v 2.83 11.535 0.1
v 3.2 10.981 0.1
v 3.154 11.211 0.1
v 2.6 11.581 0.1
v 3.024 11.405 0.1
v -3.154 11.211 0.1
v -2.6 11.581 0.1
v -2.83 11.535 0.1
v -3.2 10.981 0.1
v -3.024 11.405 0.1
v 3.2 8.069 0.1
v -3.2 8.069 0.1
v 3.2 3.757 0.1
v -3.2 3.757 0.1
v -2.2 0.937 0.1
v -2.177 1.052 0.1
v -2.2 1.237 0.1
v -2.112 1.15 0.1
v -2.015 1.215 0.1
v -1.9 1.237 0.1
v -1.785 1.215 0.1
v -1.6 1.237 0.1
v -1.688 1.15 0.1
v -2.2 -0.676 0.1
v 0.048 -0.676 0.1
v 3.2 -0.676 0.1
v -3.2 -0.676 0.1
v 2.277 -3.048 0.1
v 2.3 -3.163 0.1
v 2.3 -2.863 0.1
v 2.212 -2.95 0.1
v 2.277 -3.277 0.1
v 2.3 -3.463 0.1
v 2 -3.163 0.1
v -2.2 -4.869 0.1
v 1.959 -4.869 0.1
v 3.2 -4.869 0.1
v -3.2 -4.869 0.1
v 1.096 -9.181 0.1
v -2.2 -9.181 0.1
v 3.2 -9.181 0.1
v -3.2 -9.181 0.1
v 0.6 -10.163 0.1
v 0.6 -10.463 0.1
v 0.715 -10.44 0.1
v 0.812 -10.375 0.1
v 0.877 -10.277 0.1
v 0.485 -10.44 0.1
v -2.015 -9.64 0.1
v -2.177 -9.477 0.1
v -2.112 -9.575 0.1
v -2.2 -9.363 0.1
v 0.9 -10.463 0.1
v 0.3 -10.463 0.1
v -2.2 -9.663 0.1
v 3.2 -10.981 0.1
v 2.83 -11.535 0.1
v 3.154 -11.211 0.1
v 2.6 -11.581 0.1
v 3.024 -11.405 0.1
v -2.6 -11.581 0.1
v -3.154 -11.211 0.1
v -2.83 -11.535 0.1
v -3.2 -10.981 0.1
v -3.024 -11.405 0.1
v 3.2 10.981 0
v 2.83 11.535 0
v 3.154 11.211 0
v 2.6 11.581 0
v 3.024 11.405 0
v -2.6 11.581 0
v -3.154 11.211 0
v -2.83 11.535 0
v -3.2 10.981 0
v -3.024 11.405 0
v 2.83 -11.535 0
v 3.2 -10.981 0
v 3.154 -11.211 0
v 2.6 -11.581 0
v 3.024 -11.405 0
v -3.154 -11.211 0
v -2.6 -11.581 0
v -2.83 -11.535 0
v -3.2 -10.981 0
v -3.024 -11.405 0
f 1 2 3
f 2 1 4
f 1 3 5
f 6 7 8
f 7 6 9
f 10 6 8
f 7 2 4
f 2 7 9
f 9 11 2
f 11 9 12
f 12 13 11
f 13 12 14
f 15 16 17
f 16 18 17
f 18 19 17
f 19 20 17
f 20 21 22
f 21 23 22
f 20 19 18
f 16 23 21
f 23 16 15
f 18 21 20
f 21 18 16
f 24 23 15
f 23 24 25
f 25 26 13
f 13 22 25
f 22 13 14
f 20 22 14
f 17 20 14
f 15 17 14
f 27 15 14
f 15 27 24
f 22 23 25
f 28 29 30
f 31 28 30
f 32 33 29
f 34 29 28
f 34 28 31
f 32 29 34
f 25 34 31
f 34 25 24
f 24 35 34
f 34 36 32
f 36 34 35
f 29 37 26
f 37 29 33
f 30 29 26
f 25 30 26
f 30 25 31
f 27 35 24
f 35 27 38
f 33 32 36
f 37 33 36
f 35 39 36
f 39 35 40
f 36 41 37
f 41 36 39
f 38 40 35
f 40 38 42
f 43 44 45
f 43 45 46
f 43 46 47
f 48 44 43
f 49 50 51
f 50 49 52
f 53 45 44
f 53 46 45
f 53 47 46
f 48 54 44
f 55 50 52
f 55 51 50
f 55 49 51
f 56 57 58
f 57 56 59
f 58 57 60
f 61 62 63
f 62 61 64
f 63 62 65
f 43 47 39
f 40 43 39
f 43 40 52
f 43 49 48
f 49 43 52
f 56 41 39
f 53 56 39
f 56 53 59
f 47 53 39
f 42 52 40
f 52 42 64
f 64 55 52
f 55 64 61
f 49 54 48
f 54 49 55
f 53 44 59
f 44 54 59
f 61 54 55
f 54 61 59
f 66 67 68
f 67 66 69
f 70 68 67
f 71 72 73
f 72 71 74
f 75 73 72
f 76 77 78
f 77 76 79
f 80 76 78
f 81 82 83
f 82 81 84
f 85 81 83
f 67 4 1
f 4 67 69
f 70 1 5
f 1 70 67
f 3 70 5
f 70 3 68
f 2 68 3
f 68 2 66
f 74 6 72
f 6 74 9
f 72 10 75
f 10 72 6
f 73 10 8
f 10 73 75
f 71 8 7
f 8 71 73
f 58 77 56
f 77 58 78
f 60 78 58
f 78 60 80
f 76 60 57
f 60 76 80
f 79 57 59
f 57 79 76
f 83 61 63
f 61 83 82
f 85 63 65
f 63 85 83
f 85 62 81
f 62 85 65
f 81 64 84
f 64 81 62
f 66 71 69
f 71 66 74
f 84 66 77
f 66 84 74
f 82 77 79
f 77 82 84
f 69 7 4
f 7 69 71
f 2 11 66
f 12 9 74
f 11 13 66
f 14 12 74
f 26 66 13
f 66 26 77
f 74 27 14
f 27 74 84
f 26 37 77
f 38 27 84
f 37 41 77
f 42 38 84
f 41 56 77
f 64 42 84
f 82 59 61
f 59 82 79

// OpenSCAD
// file: ../p/1-4cyli.scad
use <../lib.scad>
function ldraw_lib__1_4cyli() = [
// 0 Cylinder 0.25
// 0 Name: 1-4cyli.dat
// 0 Author: James Jessiman
// 0 !LDRAW_ORG Primitive UPDATE 2012-01
// 0 !LICENSE Licensed under CC BY 2.0 and CC BY 4.0 : see CAreadme.txt
// 
// 0 BFC CERTIFY CCW
  [0,"BFC","CERTIFY"],
  [0,"BFC","CCW"],
// 
// 0 !HISTORY 2002-03-23 [sbliss] Added BFC statement.
// 0 !HISTORY 2002-04-25 [PTadmin] Official Update 2002-02
// 0 !HISTORY 2007-06-22 [PTadmin] Header formatted for Contributor Agreement
// 0 !HISTORY 2008-07-01 [PTadmin] Official Update 2008-01
// 0 !HISTORY 2012-02-16 [Philo] Changed to CCW
// 0 !HISTORY 2012-03-30 [PTadmin] Official Update 2012-01
// 
// 
// 4 16 1 1 0 0.9239 1 0.3827 0.9239 0 0.3827 1 0 0
  [4,16,1,1,0,0.9239,1,0.3827,0.9239,0,0.3827,1,0,0],
// 5 24 1 0 0 1 1 0 0.9239 0 0.3827 1 0 -1
  [5,24,1,0,0,1,1,0,0.9239,0,0.3827,1,0,-1],
// 4 16 0.9239 1 0.3827 0.7071 1 0.7071 0.7071 0 0.7071 0.9239 0 0.3827
  [4,16,0.9239,1,0.3827,0.7071,1,0.7071,0.7071,0,0.7071,0.9239,0,0.3827],
// 5 24 0.9239 0 0.3827 0.9239 1 0.3827 0.7071 0 0.7071 1 0 0
  [5,24,0.9239,0,0.3827,0.9239,1,0.3827,0.7071,0,0.7071,1,0,0],
// 4 16 0.7071 1 0.7071 0.3827 1 0.9239 0.3827 0 0.9239 0.7071 0 0.7071
  [4,16,0.7071,1,0.7071,0.3827,1,0.9239,0.3827,0,0.9239,0.7071,0,0.7071],
// 5 24 0.7071 0 0.7071 0.7071 1 0.7071 0.3827 0 0.9239 0.9239 0 0.3827
  [5,24,0.7071,0,0.7071,0.7071,1,0.7071,0.3827,0,0.9239,0.9239,0,0.3827],
// 4 16 0.3827 1 0.9239 0 1 1 0 0 1 0.3827 0 0.9239
  [4,16,0.3827,1,0.9239,0,1,1,0,0,1,0.3827,0,0.9239],
// 5 24 0.3827 0 0.9239 0.3827 1 0.9239 0 0 1 0.7071 0 0.7071
  [5,24,0.3827,0,0.9239,0.3827,1,0.9239,0,0,1,0.7071,0,0.7071],
// 5 24 0 0 1 0 1 1 0.3827 0 0.9239 -1 0 1
  [5,24,0,0,1,0,1,1,0.3827,0,0.9239,-1,0,1],
];
makepoly(ldraw_lib__1_4cyli(), line=0.2);
// file: ../p/3-16ndis.scad
use <../lib.scad>
function ldraw_lib__3_16ndis() = [
// 0 Disc Negative 0.1875
// 0 Name: 3-16ndis.dat
// 0 Author: Guy Vivan [guyvivan]
// 0 !LDRAW_ORG Primitive UPDATE 2009-01
// 0 !LICENSE Licensed under CC BY 2.0 and CC BY 4.0 : see CAreadme.txt
// 
// 0 BFC CERTIFY CCW
  [0,"BFC","CERTIFY"],
  [0,"BFC","CCW"],
// 
// 0 !HISTORY 2009-05-02 [PTadmin] Official Update 2009-01
// 
// 
// 3 16 1 0 1 0.9239 0 0.3827 1 0 0
  [3,16,1,0,1,0.9239,0,0.3827,1,0,0],
// 3 16 1 0 1 0.7071 0 0.7071 0.9239 0 0.3827
  [3,16,1,0,1,0.7071,0,0.7071,0.9239,0,0.3827],
// 3 16 1 0 1 0.3827 0 0.9239 0.7071 0 0.7071
  [3,16,1,0,1,0.3827,0,0.9239,0.7071,0,0.7071],
// 
// 0 end of file
// 
];
makepoly(ldraw_lib__3_16ndis(), line=0.2);
// file: ../p/3-16disc.scad
use <../lib.scad>
function ldraw_lib__3_16disc() = [
// 0 Disc 0.1875
// 0 Name: 3-16disc.dat
// 0 Author: Guy Vivan [guyvivan]
// 0 !LDRAW_ORG Primitive UPDATE 2009-01
// 0 !LICENSE Licensed under CC BY 2.0 and CC BY 4.0 : see CAreadme.txt
// 
// 0 BFC CERTIFY CCW
  [0,"BFC","CERTIFY"],
  [0,"BFC","CCW"],
// 
// 0 !HISTORY 2009-05-02 [PTadmin] Official Update 2009-01
// 
// 
// 3 16 0 0 0 1 0 0 0.9239 0 0.3827
  [3,16,0,0,0,1,0,0,0.9239,0,0.3827],
// 3 16 0 0 0 0.9239 0 0.3827 0.7071 0 0.7071
  [3,16,0,0,0,0.9239,0,0.3827,0.7071,0,0.7071],
// 3 16 0 0 0 0.7071 0 0.7071 0.3827 0 0.9239
  [3,16,0,0,0,0.7071,0,0.7071,0.3827,0,0.9239],
// 
// 0 end of file
// 
];
makepoly(ldraw_lib__3_16disc(), line=0.2);
// file: ../p/3-16chrd.scad
use <../lib.scad>
function ldraw_lib__3_16chrd() = [
// 0 Chord 0.1875
// 0 Name: 3-16chrd.dat
// 0 Author: Niels Karsdorp [nielsk]
// 0 !LDRAW_ORG Primitive UPDATE 2009-01
// 0 !LICENSE Licensed under CC BY 2.0 and CC BY 4.0 : see CAreadme.txt
// 
// 0 BFC CERTIFY CCW
  [0,"BFC","CERTIFY"],
  [0,"BFC","CCW"],
// 
// 0 !HISTORY 2009-05-02 [PTadmin] Official Update 2009-01
// 
// 
// 4 16 1 0 0 0.9239 0 0.3827 0.7071 0 0.7071 0.3827 0 0.9239
  [4,16,1,0,0,0.9239,0,0.3827,0.7071,0,0.7071,0.3827,0,0.9239],
// 0
// 
];
makepoly(ldraw_lib__3_16chrd(), line=0.2);
// file: ../p/1-8ndis.scad
use <../lib.scad>
function ldraw_lib__1_8ndis() = [
// 0 Disc Negative 0.125
// 0 Name: 1-8ndis.dat
// 0 Author: James Jessiman
// 0 !LDRAW_ORG Primitive UPDATE 2012-01
// 0 !LICENSE Licensed under CC BY 2.0 and CC BY 4.0 : see CAreadme.txt
// 
// 0 BFC CERTIFY CCW
  [0,"BFC","CERTIFY"],
  [0,"BFC","CCW"],
// 
// 0 !HISTORY 2002-03-23 [sbliss] Added BFC statement
// 0 !HISTORY 2002-04-25 [PTadmin] Official Update 2002-02
// 0 !HISTORY 2007-06-22 [PTadmin] Header formatted for Contributor Agreement
// 0 !HISTORY 2008-07-01 [PTadmin] Official Update 2008-01
// 0 !HISTORY 2012-02-16 [Philo] Changed to CCW
// 0 !HISTORY 2012-03-30 [PTadmin] Official Update 2012-01
// 
// 
// 3 16 0.9239 0 0.3827 1 0 0 1 0 1
  [3,16,0.9239,0,0.3827,1,0,0,1,0,1],
// 3 16 0.7071 0 0.7071 0.9239 0 0.3827 1 0 1
  [3,16,0.7071,0,0.7071,0.9239,0,0.3827,1,0,1],
];
makepoly(ldraw_lib__1_8ndis(), line=0.2);
// file: ../p/1-8disc.scad
use <../lib.scad>
function ldraw_lib__1_8disc() = [
// 0 Disc 0.125
// 0 Name: 1-8disc.dat
// 0 Author: James Jessiman
// 0 !LDRAW_ORG Primitive UPDATE 2002-02
// 0 !LICENSE Licensed under CC BY 2.0 and CC BY 4.0 : see CAreadme.txt
// 
// 0 BFC CERTIFY CCW
  [0,"BFC","CERTIFY"],
  [0,"BFC","CCW"],
// 
// 0 !HISTORY 1998-12-15 [PTadmin] Official Update 1998-10
// 0 !HISTORY 2002-03-23 [sbliss] Added BFC statement; merged headers from files in LDraw 0.27 and Complete.exe distributions.
// 0 !HISTORY 2002-04-25 [PTadmin] Official Update 2002-02
// 0 !HISTORY 2007-06-22 [PTadmin] Header formatted for Contributor Agreement
// 0 !HISTORY 2008-07-01 [PTadmin] Official Update 2008-01
// 
// 
// 3 16 0 0 0 1 0 0 0.9239 0 0.3827
  [3,16,0,0,0,1,0,0,0.9239,0,0.3827],
// 3 16 0 0 0 0.9239 0 0.3827 0.7071 0 0.7071
  [3,16,0,0,0,0.9239,0,0.3827,0.7071,0,0.7071],
// 0
];
makepoly(ldraw_lib__1_8disc(), line=0.2);
// file: ../p/1-16ndis.scad
use <../lib.scad>
function ldraw_lib__1_16ndis() = [
// 0 Disc Negative 0.0625
// 0 Name: 1-16ndis.dat
// 0 Author: Niels Karsdorp [nielsk]
// 0 !LDRAW_ORG Primitive UPDATE 2009-01
// 0 !LICENSE Licensed under CC BY 2.0 and CC BY 4.0 : see CAreadme.txt
// 
// 0 BFC CERTIFY CCW
  [0,"BFC","CERTIFY"],
  [0,"BFC","CCW"],
// 
// 0 !HISTORY 2009-05-02 [PTadmin] Official Update 2009-01
// 
// 
// 3 16 1 0 0 1 0 1 0.9239 0 0.3827
  [3,16,1,0,0,1,0,1,0.9239,0,0.3827],
// 0
];
makepoly(ldraw_lib__1_16ndis(), line=0.2);
// file: ../p/1-16disc.scad
use <../lib.scad>
function ldraw_lib__1_16disc() = [
// 0 Disc 0.0625
// 0 Name: 1-16disc.dat
// 0 Author: Guy Vivan [guyvivan]
// 0 !LDRAW_ORG Primitive UPDATE 2009-01
// 0 !LICENSE Licensed under CC BY 2.0 and CC BY 4.0 : see CAreadme.txt
// 
// 0 BFC CERTIFY CCW
  [0,"BFC","CERTIFY"],
  [0,"BFC","CCW"],
// 
// 0 !HISTORY 2009-05-02 [PTadmin] Official Update 2009-01
// 
// 
// 3 16 0 0 0 1 0 0 0.9239 0 0.3827
  [3,16,0,0,0,1,0,0,0.9239,0,0.3827],
// 
// 0 end of file
// 
];
makepoly(ldraw_lib__1_16disc(), line=0.2);
// file: ../p/3-8ndis.scad
use <../lib.scad>
function ldraw_lib__3_8ndis() = [
// 0 Disc Negative 0.375
// 0 Name: 3-8ndis.dat
// 0 Author: Alex Taylor [anathema]
// 0 !LDRAW_ORG Primitive UPDATE 2009-02
// 0 !LICENSE Licensed under CC BY 2.0 and CC BY 4.0 : see CAreadme.txt
// 
// 0 BFC CERTIFY CCW
  [0,"BFC","CERTIFY"],
  [0,"BFC","CCW"],
// 
// 0 !HISTORY 2009-09-03 [PTadmin] Official Update 2009-02
// 
// 
// 3 16 1 0 1 0.9239 0 0.3827 1 0 0
  [3,16,1,0,1,0.9239,0,0.3827,1,0,0],
// 3 16 1 0 1 0.7071 0 0.7071 0.9239 0 0.3827
  [3,16,1,0,1,0.7071,0,0.7071,0.9239,0,0.3827],
// 3 16 1 0 1 0.3827 0 0.9239 0.7071 0 0.7071
  [3,16,1,0,1,0.3827,0,0.9239,0.7071,0,0.7071],
// 3 16 1 0 1 0 0 1 0.3827 0 0.9239
  [3,16,1,0,1,0,0,1,0.3827,0,0.9239],
// 3 16 -1 0 1 -0.3827 0 0.9239 0 0 1
  [3,16,-1,0,1,-0.3827,0,0.9239,0,0,1],
// 3 16 -1 0 1 -0.7071 0 0.7071 -0.3827 0 0.9239
  [3,16,-1,0,1,-0.7071,0,0.7071,-0.3827,0,0.9239],
// 0
];
makepoly(ldraw_lib__3_8ndis(), line=0.2);
// file: ../p/3-8chrd.scad
use <../lib.scad>
function ldraw_lib__3_8chrd() = [
// 0 Chord 0.375
// 0 Name: 3-8chrd.dat
// 0 Author: Donald Sutter [technog]
// 0 !LDRAW_ORG Primitive UPDATE 2005-01
// 0 !LICENSE Licensed under CC BY 2.0 and CC BY 4.0 : see CAreadme.txt
// 
// 0 BFC CERTIFY CCW
  [0,"BFC","CERTIFY"],
  [0,"BFC","CCW"],
// 
// 0 !HISTORY 2004-01-07 [Steffen] added primitive code for POVray
// 0 !HISTORY 2004-03-18 [mkennedy] removed pov code and rearanged polygons.
// 0 !HISTORY 2004-09-12 [cwdee] reversed winding and standardised precision
// 0 !HISTORY 2005-12-28 [PTadmin] Official Update 2005-01
// 0 !HISTORY 2007-06-24 [PTadmin] Header formatted for Contributor Agreement
// 0 !HISTORY 2008-07-01 [PTadmin] Official Update 2008-01
// 
// 
// 3 16 0.7071 0 0.7071 0.3827 0 0.9239 0 0 1
  [3,16,0.7071,0,0.7071,0.3827,0,0.9239,0,0,1],
// 4 16 0.9239 0 0.3827 -0.3827 0 0.9239 -0.7071 0 0.7071 1 0 0
  [4,16,0.9239,0,0.3827,-0.3827,0,0.9239,-0.7071,0,0.7071,1,0,0],
// 4 16 0.7071 0 0.7071 0 0 1 -0.3827 0 0.9239 0.9239 0 0.3827
  [4,16,0.7071,0,0.7071,0,0,1,-0.3827,0,0.9239,0.9239,0,0.3827],
// 0
];
makepoly(ldraw_lib__3_8chrd(), line=0.2);
// file: ../p/1-4chrd.scad
use <../lib.scad>
function ldraw_lib__1_4chrd() = [
// 0 Chord 0.25
// 0 Name: 1-4chrd.dat
// 0 Author: Tony Hafner [hafhead]
// 0 !LDRAW_ORG Primitive UPDATE 2012-02
// 0 !LICENSE Licensed under CC BY 2.0 and CC BY 4.0 : see CAreadme.txt
// 
// 0 BFC CERTIFY CCW
  [0,"BFC","CERTIFY"],
  [0,"BFC","CCW"],
// 
// 0 !HISTORY 2004-04-22 [PTadmin] Official Update 2004-02
// 0 !HISTORY 2007-10-09 [PTadmin] Header formatted for Contributor Agreement
// 0 !HISTORY 2008-07-01 [PTadmin] Official Update 2008-01
// 0 !HISTORY 2012-08-02 [MMR1988] Re-creation with PrimGen2 and Rectifier
// 0 !HISTORY 2012-08-09 [PTadmin] Official Update 2012-02
// 
// 
// 4 16 0.9239 0 0.3827 0.3827 0 0.9239 0 0 1 1 0 0
  [4,16,0.9239,0,0.3827,0.3827,0,0.9239,0,0,1,1,0,0],
// 3 16 0.7071 0 0.7071 0.3827 0 0.9239 0.9239 0 0.3827
  [3,16,0.7071,0,0.7071,0.3827,0,0.9239,0.9239,0,0.3827],
];
makepoly(ldraw_lib__1_4chrd(), line=0.2);
// file: s/6142622vs06.scad
use <../../lib.scad>
use <../../p/1-4chrd.scad>
use <../../p/1-4cyli.scad>
function ldraw_lib__s__6142622vs06() = [
// 0 ~Sticker  2.9 x  0.8 with Black Trapezoid on Yellow Background Left - Bottom Face
// 0 Name: s\6142622vs06.dat
// 0 Author: Massimo Maso [Sirio]
// 0 !LDRAW_ORG Subpart UPDATE 2022-03
// 0 !LICENSE Licensed under CC BY 2.0 and CC BY 4.0 : see CAreadme.txt
// 
// 0 BFC CERTIFY CCW
  [0,"BFC","CERTIFY"],
  [0,"BFC","CCW"],
// 
// 0 !HISTORY 2022-05-07 [PTadmin] Official Update 2022-03
// 
// 
// 0 // Primitives
// 1 16 -6.5 0 77.359 0 0 -1.5 0 -1 0 1.5 0 0 1-4chrd.dat
  [1,16,-6.5,0,77.359,0,0,-1.5,0,-1,0,1.5,0,0, ldraw_lib__1_4chrd()],
// 1 16 6.5 0 77.359 1.5 0 0 0 -1 0 0 0 1.5 1-4chrd.dat
  [1,16,6.5,0,77.359,1.5,0,0,0,-1,0,0,0,1.5, ldraw_lib__1_4chrd()],
// 1 16 -6.5 0 22.4535 -1.5 0 0 0 -1 0 0 0 -1.5 1-4chrd.dat
  [1,16,-6.5,0,22.4535,-1.5,0,0,0,-1,0,0,0,-1.5, ldraw_lib__1_4chrd()],
// 1 16 6.5 0 22.4535 0 0 1.5 0 -1 0 -1.5 0 0 1-4chrd.dat
  [1,16,6.5,0,22.4535,0,0,1.5,0,-1,0,-1.5,0,0, ldraw_lib__1_4chrd()],
// 1 16 -6.5 0 77.359 0 0 -1.5 0 -.25 0 1.5 0 0 1-4cyli.dat
  [1,16,-6.5,0,77.359,0,0,-1.5,0,-.25,0,1.5,0,0, ldraw_lib__1_4cyli()],
// 1 16 6.5 0 77.359 1.5 0 0 0 -.25 0 0 0 1.5 1-4cyli.dat
  [1,16,6.5,0,77.359,1.5,0,0,0,-.25,0,0,0,1.5, ldraw_lib__1_4cyli()],
// 1 16 -6.5 0 22.4535 -1.5 0 0 0 -.25 0 0 0 -1.5 1-4cyli.dat
  [1,16,-6.5,0,22.4535,-1.5,0,0,0,-.25,0,0,0,-1.5, ldraw_lib__1_4cyli()],
// 1 16 6.5 0 22.4535 0 0 1.5 0 -.25 0 -1.5 0 0 1-4cyli.dat
  [1,16,6.5,0,22.4535,0,0,1.5,0,-.25,0,-1.5,0,0, ldraw_lib__1_4cyli()],
// 0 // Bottom face
// 4 16 -6.5 0 78.859 6.5 0 78.859 8 0 77.359 -8 0 77.359
  [4,16,-6.5,0,78.859,6.5,0,78.859,8,0,77.359,-8,0,77.359],
// 4 16 -8 0 77.359 8 0 77.359 8 0 22.4535 -8 0 22.4535
  [4,16,-8,0,77.359,8,0,77.359,8,0,22.4535,-8,0,22.4535],
// 4 16 -8 0 22.4535 8 0 22.4535 6.5 0 20.9535 -6.5 0 20.9535
  [4,16,-8,0,22.4535,8,0,22.4535,6.5,0,20.9535,-6.5,0,20.9535],
// 0 // Lateral faces
// 4 16 -6.5 0 78.859 -6.5 -.25 78.859 6.5 -.25 78.859 6.5 0 78.859
  [4,16,-6.5,0,78.859,-6.5,-.25,78.859,6.5,-.25,78.859,6.5,0,78.859],
// 3 16 -8 0 77.359 -8 -.25 70.0796 -8 -.25 77.359
  [3,16,-8,0,77.359,-8,-.25,70.0796,-8,-.25,77.359],
// 3 16 8 0 77.359 8 -.25 77.359 8 -.25 70.0796
  [3,16,8,0,77.359,8,-.25,77.359,8,-.25,70.0796],
// 3 16 -8 0 77.359 -8 -.25 59.2983 -8 -.25 70.0796
  [3,16,-8,0,77.359,-8,-.25,59.2983,-8,-.25,70.0796],
// 3 16 8 0 77.359 8 -.25 70.0796 8 -.25 59.2983
  [3,16,8,0,77.359,8,-.25,70.0796,8,-.25,59.2983],
// 4 16 -8 0 77.359 -8 0 22.4535 -8 -.25 48.2168 -8 -.25 59.2983
  [4,16,-8,0,77.359,-8,0,22.4535,-8,-.25,48.2168,-8,-.25,59.2983],
// 4 16 8 0 77.359 8 -.25 59.2983 8 -.25 48.2168 8 0 22.4535
  [4,16,8,0,77.359,8,-.25,59.2983,8,-.25,48.2168,8,0,22.4535],
// 3 16 -8 0 22.4535 -8 -.25 37.7348 -8 -.25 48.2168
  [3,16,-8,0,22.4535,-8,-.25,37.7348,-8,-.25,48.2168],
// 3 16 8 0 22.4535 8 -.25 48.2168 8 -.25 37.7348
  [3,16,8,0,22.4535,8,-.25,48.2168,8,-.25,37.7348],
// 3 16 -8 0 22.4535 -8 -.25 26.9535 -8 -.25 37.7348
  [3,16,-8,0,22.4535,-8,-.25,26.9535,-8,-.25,37.7348],
// 3 16 8 0 22.4535 8 -.25 37.7348 8 -.25 26.9535
  [3,16,8,0,22.4535,8,-.25,37.7348,8,-.25,26.9535],
// 3 16 -8 0 22.4535 -8 -.25 22.4535 -8 -.25 26.9535
  [3,16,-8,0,22.4535,-8,-.25,22.4535,-8,-.25,26.9535],
// 3 16 8 0 22.4535 8 -.25 26.9535 8 -.25 22.4535
  [3,16,8,0,22.4535,8,-.25,26.9535,8,-.25,22.4535],
// 4 16 -6.5 0 20.9535 6.5 0 20.9535 6.5 -.25 20.9535 -6.5 -.25 20.9535
  [4,16,-6.5,0,20.9535,6.5,0,20.9535,6.5,-.25,20.9535,-6.5,-.25,20.9535],
];
makepoly(ldraw_lib__s__6142622vs06(), line=0.2);
// file: s/6142622vs05.scad
use <../../lib.scad>
use <../../p/1-16disc.scad>
use <../../p/1-16ndis.scad>
use <../../p/1-4chrd.scad>
use <../../p/3-16chrd.scad>
use <../../p/3-16disc.scad>
use <../../p/3-16ndis.scad>
function ldraw_lib__s__6142622vs05() = [
// 0 ~Sticker  2.9 x  0.8 with Black Trapezoid on Yellow Background Left - Sixth Face
// 0 Name: s\6142622vs05.dat
// 0 Author: Massimo Maso [Sirio]
// 0 !LDRAW_ORG Subpart UPDATE 2022-03
// 0 !LICENSE Licensed under CC BY 2.0 and CC BY 4.0 : see CAreadme.txt
// 
// 0 BFC CERTIFY CCW
  [0,"BFC","CERTIFY"],
  [0,"BFC","CCW"],
// 
// 0 !HISTORY 2022-05-07 [PTadmin] Official Update 2022-03
// 
// 
// 0 // Primitives
// 1 0 -1.5 -.25 -2.4514 0 0 -.75 0 1 0 -.75 0 0 3-16disc.dat
  [1,0,-1.5,-.25,-2.4514,0,0,-.75,0,1,0,-.75,0,0, ldraw_lib__3_16disc()],
// 1 0 -1.5 -.25 -2.4514 0 0 .75 0 1 0 -.75 0 0 1-16disc.dat
  [1,0,-1.5,-.25,-2.4514,0,0,.75,0,1,0,-.75,0,0, ldraw_lib__1_16disc()],
// 1 0 4.75 -.25 -.4514 .75 0 0 0 1 0 0 0 -.75 3-16chrd.dat
  [1,0,4.75,-.25,-.4514,.75,0,0,0,1,0,0,0,-.75, ldraw_lib__3_16chrd()],
// 1 14 -1.5 -.25 -2.4514 0 0 -.75 0 1 0 -.75 0 0 3-16ndis.dat
  [1,14,-1.5,-.25,-2.4514,0,0,-.75,0,1,0,-.75,0,0, ldraw_lib__3_16ndis()],
// 1 14 -1.5 -.25 -2.4514 0 0 .75 0 1 0 -.75 0 0 1-16ndis.dat
  [1,14,-1.5,-.25,-2.4514,0,0,.75,0,1,0,-.75,0,0, ldraw_lib__1_16ndis()],
// 1 14 4.75 -.25 -.4514 .75 0 0 0 1 0 0 0 -.75 3-16ndis.dat
  [1,14,4.75,-.25,-.4514,.75,0,0,0,1,0,0,0,-.75, ldraw_lib__3_16ndis()],
// 1 14 -6.5 -.25 -4.4979 -1.5 0 0 0 1 0 0 0 -1.5 1-4chrd.dat
  [1,14,-6.5,-.25,-4.4979,-1.5,0,0,0,1,0,0,0,-1.5, ldraw_lib__1_4chrd()],
// 1 14 6.5 -.25 -4.4979 0 0 1.5 0 1 0 -1.5 0 0 1-4chrd.dat
  [1,14,6.5,-.25,-4.4979,0,0,1.5,0,1,0,-1.5,0,0, ldraw_lib__1_4chrd()],
// 0 // Black faces
// 3 0 -2.741 -.25 .0021 -2.192925 -.25 -2.738425 -1.5 -.25 -2.4514
  [3,0,-2.741,-.25,.0021,-2.192925,-.25,-2.738425,-1.5,-.25,-2.4514],
// 4 0 -2.741 -.25 .0021 -1.5 -.25 -2.4514 5.5 -.25 -.4514 5.5 -.25 .0021
  [4,0,-2.741,-.25,.0021,-1.5,-.25,-2.4514,5.5,-.25,-.4514,5.5,-.25,.0021],
// 4 0 5.5 -.25 -.4514 -1.5 -.25 -2.4514 -1.212975 -.25 -3.144325 5.037025 -.25 -1.144325
  [4,0,5.5,-.25,-.4514,-1.5,-.25,-2.4514,-1.212975,-.25,-3.144325,5.037025,-.25,-1.144325],
// 0 // Yellow faces
// 3 14 -2.741 -.25 .0021 -8 -.25 .0021 -8 -.25 -4.4979
  [3,14,-2.741,-.25,.0021,-8,-.25,.0021,-8,-.25,-4.4979],
// 4 14 -2.741 -.25 .0021 -8 -.25 -4.4979 -6.5 -.25 -5.9979 -2.25 -.25 -3.2014
  [4,14,-2.741,-.25,.0021,-8,-.25,-4.4979,-6.5,-.25,-5.9979,-2.25,-.25,-3.2014],
// 3 14 -2.741 -.25 .0021 -2.25 -.25 -3.2014 -2.192925 -.25 -2.738425
  [3,14,-2.741,-.25,.0021,-2.25,-.25,-3.2014,-2.192925,-.25,-2.738425],
// 4 14 8 -.25 -4.4979 8 -.25 .0021 5.5 -.25 .0021 5.5 -.25 -.4514
  [4,14,8,-.25,-4.4979,8,-.25,.0021,5.5,-.25,.0021,5.5,-.25,-.4514],
// 4 14 8 -.25 -4.4979 5.5 -.25 -.4514 5.5 -.25 -1.2014 6.5 -.25 -5.9979
  [4,14,8,-.25,-4.4979,5.5,-.25,-.4514,5.5,-.25,-1.2014,6.5,-.25,-5.9979],
// 4 14 -1.212975 -.25 -3.144325 -.75 -.25 -3.2014 5.5 -.25 -1.2014 5.037025 -.25 -1.144325
  [4,14,-1.212975,-.25,-3.144325,-.75,-.25,-3.2014,5.5,-.25,-1.2014,5.037025,-.25,-1.144325],
// 3 14 -6.5 -.25 -5.9979 -1.5 -.25 -3.2014 -2.25 -.25 -3.2014
  [3,14,-6.5,-.25,-5.9979,-1.5,-.25,-3.2014,-2.25,-.25,-3.2014],
// 3 14 -6.5 -.25 -5.9979 -.75 -.25 -3.2014 -1.5 -.25 -3.2014
  [3,14,-6.5,-.25,-5.9979,-.75,-.25,-3.2014,-1.5,-.25,-3.2014],
// 4 14 -6.5 -.25 -5.9979 6.5 -.25 -5.9979 5.5 -.25 -1.2014 -.75 -.25 -3.2014
  [4,14,-6.5,-.25,-5.9979,6.5,-.25,-5.9979,5.5,-.25,-1.2014,-.75,-.25,-3.2014],
];
makepoly(ldraw_lib__s__6142622vs05(), line=0.2);
// file: s/6142622vs04.scad
use <../../lib.scad>
function ldraw_lib__s__6142622vs04() = [
// 0 ~Sticker  2.9 x  0.8 with Black Trapezoid on Yellow Background Left - Fifth Face
// 0 Name: s\6142622vs04.dat
// 0 Author: Massimo Maso [Sirio]
// 0 !LDRAW_ORG Subpart UPDATE 2022-03
// 0 !LICENSE Licensed under CC BY 2.0 and CC BY 4.0 : see CAreadme.txt
// 
// 0 BFC CERTIFY CCW
  [0,"BFC","CERTIFY"],
  [0,"BFC","CCW"],
// 
// 0 !HISTORY 2022-05-07 [PTadmin] Official Update 2022-03
// 
// 
// 0 // Black face
// 4 0 -4.8973 -.25 10.7792 -2.741 -.25 -.0021 5.5 -.25 -.0021 5.5 -.25 10.7792
  [4,0,-4.8973,-.25,10.7792,-2.741,-.25,-.0021,5.5,-.25,-.0021,5.5,-.25,10.7792],
// 0 // Yellow faces
// 4 14 -8 -.25 10.7792 -8 -.25 -.0021 -2.741 -.25 -.0021 -4.8973 -.25 10.7792
  [4,14,-8,-.25,10.7792,-8,-.25,-.0021,-2.741,-.25,-.0021,-4.8973,-.25,10.7792],
// 4 14 8 -.25 10.7792 5.5 -.25 10.7792 5.5 -.25 -.0021 8 -.25 -.0021
  [4,14,8,-.25,10.7792,5.5,-.25,10.7792,5.5,-.25,-.0021,8,-.25,-.0021],
];
makepoly(ldraw_lib__s__6142622vs04(), line=0.2);
// file: s/6142622vs03.scad
use <../../lib.scad>
use <../../p/1-16disc.scad>
use <../../p/1-16ndis.scad>
use <../../p/1-8disc.scad>
use <../../p/1-8ndis.scad>
function ldraw_lib__s__6142622vs03() = [
// 0 ~Sticker  2.9 x  0.8 with Black Trapezoid on Yellow Background Left - Fourth Face
// 0 Name: s\6142622vs03.dat
// 0 Author: Massimo Maso [Sirio]
// 0 !LDRAW_ORG Subpart UPDATE 2022-03
// 0 !LICENSE Licensed under CC BY 2.0 and CC BY 4.0 : see CAreadme.txt
// 
// 0 BFC CERTIFY CCW
  [0,"BFC","CERTIFY"],
  [0,"BFC","CCW"],
// 
// 0 !HISTORY 2022-05-07 [PTadmin] Official Update 2022-03
// 
// 
// 0 // Primitives
// 1 14 -5 -.25 -6.2144 -.75 0 0 0 1 0 0 0 .75 1-8ndis.dat
  [1,14,-5,-.25,-6.2144,-.75,0,0,0,1,0,0,0,.75, ldraw_lib__1_8ndis()],
// 1 14 -5 -.25 -6.2144 -.75 0 0 0 1 0 0 0 -.75 1-16ndis.dat
  [1,14,-5,-.25,-6.2144,-.75,0,0,0,1,0,0,0,-.75, ldraw_lib__1_16ndis()],
// 1 0 -5 -.25 -6.2144 -.75 0 0 0 1 0 0 0 .75 1-8disc.dat
  [1,0,-5,-.25,-6.2144,-.75,0,0,0,1,0,0,0,.75, ldraw_lib__1_8disc()],
// 1 0 -5 -.25 -6.2144 -.75 0 0 0 1 0 0 0 -.75 1-16disc.dat
  [1,0,-5,-.25,-6.2144,-.75,0,0,0,1,0,0,0,-.75, ldraw_lib__1_16disc()],
// 0 // Black faces
// 4 0 -5 -.25 -6.2144 5.5 -.25 .0024 -.121239 -.25 .0024 -5.530325 -.25 -5.68408
  [4,0,-5,-.25,-6.2144,5.5,-.25,.0024,-.121239,-.25,.0024,-5.530325,-.25,-5.68408],
// 3 0 -5 -.25 -6.2144 5.5 -.25 -10.4796 5.5 -.25 .0024
  [3,0,-5,-.25,-6.2144,5.5,-.25,-10.4796,5.5,-.25,.0024],
// 4 0 -5 -.25 -6.2144 -5.692925 -.25 -6.50142 -4.8973 -.25 -10.4796 5.5 -.25 -10.4796
  [4,0,-5,-.25,-6.2144,-5.692925,-.25,-6.50142,-4.8973,-.25,-10.4796,5.5,-.25,-10.4796],
// 0 // Yellow faces
// 4 14 -8 -.25 .0024 -8 -.25 -10.4796 -5.75 -.25 -6.9644 -5.75 -.25 -6.2144
  [4,14,-8,-.25,.0024,-8,-.25,-10.4796,-5.75,-.25,-6.9644,-5.75,-.25,-6.2144],
// 3 14 -8 -.25 .0024 -5.75 -.25 -6.2144 -5.75 -.25 -5.4644
  [3,14,-8,-.25,.0024,-5.75,-.25,-6.2144,-5.75,-.25,-5.4644],
// 4 14 -8 -.25 .0024 -5.75 -.25 -5.4644 -5.530325 -.25 -5.684075 -.121239 -.25 .0024
  [4,14,-8,-.25,.0024,-5.75,-.25,-5.4644,-5.530325,-.25,-5.684075,-.121239,-.25,.0024],
// 4 14 8 -.25 .0024 5.5 -.25 .0024 5.5 -.25 -10.4796 8 -.25 -10.4796
  [4,14,8,-.25,.0024,5.5,-.25,.0024,5.5,-.25,-10.4796,8,-.25,-10.4796],
// 3 14 -4.8973 -.25 -10.4796 -5.692925 -.25 -6.501425 -5.75 -.25 -6.9644
  [3,14,-4.8973,-.25,-10.4796,-5.692925,-.25,-6.501425,-5.75,-.25,-6.9644],
// 3 14 -4.8973 -.25 -10.4796 -5.75 -.25 -6.9644 -8 -.25 -10.4796
  [3,14,-4.8973,-.25,-10.4796,-5.75,-.25,-6.9644,-8,-.25,-10.4796],
];
makepoly(ldraw_lib__s__6142622vs03(), line=0.2);
// file: s/6142622vs02.scad
use <../../lib.scad>
use <../../p/3-8chrd.scad>
use <../../p/3-8ndis.scad>
function ldraw_lib__s__6142622vs02() = [
// 0 ~Sticker  2.9 x  0.8 with Black Trapezoid on Yellow Background Left - Third Face
// 0 Name: s\6142622vs02.dat
// 0 Author: Massimo Maso [Sirio]
// 0 !LDRAW_ORG Subpart UPDATE 2022-03
// 0 !LICENSE Licensed under CC BY 2.0 and CC BY 4.0 : see CAreadme.txt
// 
// 0 BFC CERTIFY CCW
  [0,"BFC","CERTIFY"],
  [0,"BFC","CCW"],
// 
// 0 !HISTORY 2022-05-07 [PTadmin] Official Update 2022-03
// 
// 
// 0 // Primitives
// 1 14 4.75 -.25 4.0308 .75 0 0 0 1 0 0 0 .75 3-8ndis.dat
  [1,14,4.75,-.25,4.0308,.75,0,0,0,1,0,0,0,.75, ldraw_lib__3_8ndis()],
// 1 0 4.75 -.25 4.0308 .75 0 0 0 1 0 0 0 .75 3-8chrd.dat
  [1,0,4.75,-.25,4.0308,.75,0,0,0,1,0,0,0,.75, ldraw_lib__3_8chrd()],
// 0 // Black face
// 4 0 5.5 -.25 -.0024 5.5 -.25 4.0308 4.219675 -.25 4.561125 -.121239 -.25 -.0024
  [4,0,5.5,-.25,-.0024,5.5,-.25,4.0308,4.219675,-.25,4.561125,-.121239,-.25,-.0024],
// 0 // Yellow face
// 3 14 -8 -.25 11.0791 -8 -.25 -.0024 -.121239 -.25 -.0024
  [3,14,-8,-.25,11.0791,-8,-.25,-.0024,-.121239,-.25,-.0024],
// 4 14 -8 -.25 11.0791 -.121239 -.25 -.0024 4 -.25 4.7808 8 -.25 11.0791
  [4,14,-8,-.25,11.0791,-.121239,-.25,-.0024,4,-.25,4.7808,8,-.25,11.0791],
// 3 14 8 -.25 11.0791 4 -.25 4.7808 4.75 -.25 4.7808
  [3,14,8,-.25,11.0791,4,-.25,4.7808,4.75,-.25,4.7808],
// 3 14 8 -.25 11.0791 4.75 -.25 4.7808 5.5 -.25 4.7808
  [3,14,8,-.25,11.0791,4.75,-.25,4.7808,5.5,-.25,4.7808],
// 3 14 8 -.25 11.0791 5.5 -.25 4.7808 5.5 -.25 4.0308
  [3,14,8,-.25,11.0791,5.5,-.25,4.7808,5.5,-.25,4.0308],
// 4 14 8 -.25 11.0791 5.5 -.25 4.0308 5.5 -.25 -.0024 8 -.25 -.0024
  [4,14,8,-.25,11.0791,5.5,-.25,4.0308,5.5,-.25,-.0024,8,-.25,-.0024],
// 3 14 -.121239 -.25 -.0024 4.219675 -.25 4.561125 4 -.25 4.7808
  [3,14,-.121239,-.25,-.0024,4.219675,-.25,4.561125,4,-.25,4.7808],
];
makepoly(ldraw_lib__s__6142622vs02(), line=0.2);
// file: s/6142622vs01.scad
use <../../lib.scad>
use <../../p/1-4chrd.scad>
function ldraw_lib__s__6142622vs01() = [
// 0 ~Sticker  2.9 x  0.8 with Black Trapezoid on Yellow Background Left - First Face
// 0 Name: s\6142622vs01.dat
// 0 Author: Massimo Maso [Sirio]
// 0 !LDRAW_ORG Subpart UPDATE 2022-03
// 0 !LICENSE Licensed under CC BY 2.0 and CC BY 4.0 : see CAreadme.txt
// 
// 0 BFC CERTIFY CCW
  [0,"BFC","CERTIFY"],
  [0,"BFC","CCW"],
// 
// 0 !HISTORY 2022-05-07 [PTadmin] Official Update 2022-03
// 
// 
// 0 // Primitives
// 1 14 -6.5 -.25 7.2773 0 0 -1.5 0 1 0 1.5 0 0 1-4chrd.dat
  [1,14,-6.5,-.25,7.2773,0,0,-1.5,0,1,0,1.5,0,0, ldraw_lib__1_4chrd()],
// 1 14 6.5 -.25 7.2773 0 0 1.5 0 1 0 1.5 0 0 1-4chrd.dat
  [1,14,6.5,-.25,7.2773,0,0,1.5,0,1,0,1.5,0,0, ldraw_lib__1_4chrd()],
// 0 // Yellow face
// 4 14 -8 -.25 7.2773 8 -.25 7.2773 6.5 -.25 8.7773 -6.5 -.25 8.7773
  [4,14,-8,-.25,7.2773,8,-.25,7.2773,6.5,-.25,8.7773,-6.5,-.25,8.7773],
// 4 14 -8 -.25 7.2773 -8 -.25 -.0021 8 -.25 -.0021 8 -.25 7.2773
  [4,14,-8,-.25,7.2773,-8,-.25,-.0021,8,-.25,-.0021,8,-.25,7.2773],
];
makepoly(ldraw_lib__s__6142622vs01(), line=0.2);
// file: 6142622v.scad
use <../lib.scad>
use <s/6142622vs01.scad>
use <s/6142622vs02.scad>
use <s/6142622vs03.scad>
use <s/6142622vs04.scad>
use <s/6142622vs05.scad>
use <s/6142622vs06.scad>
function ldraw_lib__6142622v() = [
// 0 Sticker  2.9 x  0.8 with Black Trapezoid on Yellow Background Left
// 0 Name: 6142622v.dat
// 0 Author: Massimo Maso [Sirio]
// 0 !LDRAW_ORG Part UPDATE 2022-03
// 0 !LICENSE Licensed under CC BY 2.0 and CC BY 4.0 : see CAreadme.txt
// 
// 0 !HELP Left is referred to the real vehicle
// 0 !HELP In Lego instruction this part is on the right of the vehicle
// 
// 0 BFC CERTIFY CCW
  [0,"BFC","CERTIFY"],
  [0,"BFC","CCW"],
// 
// 0 !KEYWORDS Chevrolet, Corvette, Set 75870, Speed Champions
// 
// 0 !HISTORY 2022-05-07 [PTadmin] Official Update 2022-03
// 
// 
// 1 16 0 0 20.1754 1 0 0 0 1 0 0 0 1 s\6142622vs01.dat
  [1,16,0,0,20.1754,1,0,0,0,1,0,0,0,1, ldraw_lib__s__6142622vs01()],
// 4 14 -8 -.25 20.1733 -8 -.25 9.392 8 -.25 9.392 8 -.25 20.1733
  [4,14,-8,-.25,20.1733,-8,-.25,9.392,8,-.25,9.392,8,-.25,20.1733],
// 1 16 0 0 -1.6871 1 0 0 0 1 0 0 0 1 s\6142622vs02.dat
  [1,16,0,0,-1.6871,1,0,0,0,1,0,0,0,1, ldraw_lib__s__6142622vs02()],
// 1 16 0 0 -1.6919 1 0 0 0 1 0 0 0 1 s\6142622vs03.dat
  [1,16,0,0,-1.6919,1,0,0,0,1,0,0,0,1, ldraw_lib__s__6142622vs03()],
// 1 16 0 0 -22.9507 1 0 0 0 1 0 0 0 1 s\6142622vs04.dat
  [1,16,0,0,-22.9507,1,0,0,0,1,0,0,0,1, ldraw_lib__s__6142622vs04()],
// 1 16 0 0 -22.9549 1 0 0 0 1 0 0 0 1 s\6142622vs05.dat
  [1,16,0,0,-22.9549,1,0,0,0,1,0,0,0,1, ldraw_lib__s__6142622vs05()],
// 1 16 0 0 -49.9063 1 0 0 0 1 0 0 0 1 s\6142622vs06.dat
  [1,16,0,0,-49.9063,1,0,0,0,1,0,0,0,1, ldraw_lib__s__6142622vs06()],
];
makepoly(ldraw_lib__6142622v(), line=0.2);
// main file
use <../lib.scad>
use <6142622v.scad>
function ldraw_lib__6142622w() = [
// 0 Sticker  2.9 x  0.8 with Black Trapezoid on Yellow Background Right
// 0 Name: 6142622w.dat
// 0 Author: Massimo Maso [Sirio]
// 0 !LDRAW_ORG Part UPDATE 2022-03
// 0 !LICENSE Licensed under CC BY 2.0 and CC BY 4.0 : see CAreadme.txt
// 
// 0 !HELP Right is referred to the real vehicle
// 0 !HELP In Lego instruction this part is on the left of the vehicle
// 
// 0 BFC CERTIFY CCW
  [0,"BFC","CERTIFY"],
  [0,"BFC","CCW"],
// 
// 0 !KEYWORDS Chevrolet, Corvette, Set 75870, Speed Champions
// 
// 0 !HISTORY 2022-05-07 [PTadmin] Official Update 2022-03
// 
// 
// 1 16 0 0 0 -1 0 0 0 1 0 0 0 1 6142622v.dat
  [1,16,0,0,0,-1,0,0,0,1,0,0,0,1, ldraw_lib__6142622v()],
];
makepoly(ldraw_lib__6142622w(), line=0.2);
